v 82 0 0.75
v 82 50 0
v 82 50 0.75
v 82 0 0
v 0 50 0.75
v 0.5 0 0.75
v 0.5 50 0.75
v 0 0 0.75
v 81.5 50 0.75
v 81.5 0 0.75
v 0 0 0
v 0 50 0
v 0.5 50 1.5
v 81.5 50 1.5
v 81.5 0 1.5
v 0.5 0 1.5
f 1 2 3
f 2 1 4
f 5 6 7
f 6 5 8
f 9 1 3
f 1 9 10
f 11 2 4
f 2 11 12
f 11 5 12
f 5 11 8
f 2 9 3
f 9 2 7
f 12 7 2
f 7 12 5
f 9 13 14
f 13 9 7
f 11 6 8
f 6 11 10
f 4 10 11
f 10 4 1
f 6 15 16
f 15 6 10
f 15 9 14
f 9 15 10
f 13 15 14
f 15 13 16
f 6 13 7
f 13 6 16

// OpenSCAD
// file: definitions.scad
$fn=20;

//Measurements of the open part of the PSU with screw terminals
psu_x = 82;
psu_y = 11.6;
psu_z = 30;

//Set thickness of vertical wall on side of PSU
psu_x_thick = 1.3;

//Placeholder for base thickness
psu_z_thick = 1.3;

//Location of holes used for holding this cover
base_hole_x = 76.5;
base_hole_y = 4.5;
base_hole_r = 1.75;

wall_hole_y = 6.5;
wall_hole_z = 26;
wall_hole_r = 1.75;

//Variable for extra y distance
cover_extra_y = 50;

//Variables relating to the exposed PSU section of the cover
wall_z_extend = wall_hole_z - 5;
wall_x_extend = psu_x - base_hole_x + base_hole_r + 1;
wall_vert_thick = 1;
wall_top_thick = 1;
vert_tab_clear = 2;

//Variables relating to the empty section of the cover
empty_wall_thick = 1;
empty_base_wall_thick = 1.5;

mains_cable_cut_x = 18;
mains_cable_cut_y = 0;
mains_cable_cut_z = 0;
mains_cable_cut_x_thick = 8;
mains_cable_cut_z_thick = 10;

led_cable_cut_x = mains_cable_cut_x + 35;
led_cable_cut_y = 0;
led_cable_cut_z = 0;
led_cable_cut_x_thick = 8;
led_cable_cut_z_thick = 10;

//Derived variables
cover_x = psu_x;
cover_y = cover_extra_y + psu_y;
cover_z = psu_z;
// main file
include <definitions.scad>

cube([psu_x, cover_extra_y, empty_base_wall_thick/2]);
translate([empty_wall_thick/2, 0, empty_base_wall_thick/2]){
	cube([psu_x - empty_wall_thick, cover_extra_y, empty_base_wall_thick/2]);
}
